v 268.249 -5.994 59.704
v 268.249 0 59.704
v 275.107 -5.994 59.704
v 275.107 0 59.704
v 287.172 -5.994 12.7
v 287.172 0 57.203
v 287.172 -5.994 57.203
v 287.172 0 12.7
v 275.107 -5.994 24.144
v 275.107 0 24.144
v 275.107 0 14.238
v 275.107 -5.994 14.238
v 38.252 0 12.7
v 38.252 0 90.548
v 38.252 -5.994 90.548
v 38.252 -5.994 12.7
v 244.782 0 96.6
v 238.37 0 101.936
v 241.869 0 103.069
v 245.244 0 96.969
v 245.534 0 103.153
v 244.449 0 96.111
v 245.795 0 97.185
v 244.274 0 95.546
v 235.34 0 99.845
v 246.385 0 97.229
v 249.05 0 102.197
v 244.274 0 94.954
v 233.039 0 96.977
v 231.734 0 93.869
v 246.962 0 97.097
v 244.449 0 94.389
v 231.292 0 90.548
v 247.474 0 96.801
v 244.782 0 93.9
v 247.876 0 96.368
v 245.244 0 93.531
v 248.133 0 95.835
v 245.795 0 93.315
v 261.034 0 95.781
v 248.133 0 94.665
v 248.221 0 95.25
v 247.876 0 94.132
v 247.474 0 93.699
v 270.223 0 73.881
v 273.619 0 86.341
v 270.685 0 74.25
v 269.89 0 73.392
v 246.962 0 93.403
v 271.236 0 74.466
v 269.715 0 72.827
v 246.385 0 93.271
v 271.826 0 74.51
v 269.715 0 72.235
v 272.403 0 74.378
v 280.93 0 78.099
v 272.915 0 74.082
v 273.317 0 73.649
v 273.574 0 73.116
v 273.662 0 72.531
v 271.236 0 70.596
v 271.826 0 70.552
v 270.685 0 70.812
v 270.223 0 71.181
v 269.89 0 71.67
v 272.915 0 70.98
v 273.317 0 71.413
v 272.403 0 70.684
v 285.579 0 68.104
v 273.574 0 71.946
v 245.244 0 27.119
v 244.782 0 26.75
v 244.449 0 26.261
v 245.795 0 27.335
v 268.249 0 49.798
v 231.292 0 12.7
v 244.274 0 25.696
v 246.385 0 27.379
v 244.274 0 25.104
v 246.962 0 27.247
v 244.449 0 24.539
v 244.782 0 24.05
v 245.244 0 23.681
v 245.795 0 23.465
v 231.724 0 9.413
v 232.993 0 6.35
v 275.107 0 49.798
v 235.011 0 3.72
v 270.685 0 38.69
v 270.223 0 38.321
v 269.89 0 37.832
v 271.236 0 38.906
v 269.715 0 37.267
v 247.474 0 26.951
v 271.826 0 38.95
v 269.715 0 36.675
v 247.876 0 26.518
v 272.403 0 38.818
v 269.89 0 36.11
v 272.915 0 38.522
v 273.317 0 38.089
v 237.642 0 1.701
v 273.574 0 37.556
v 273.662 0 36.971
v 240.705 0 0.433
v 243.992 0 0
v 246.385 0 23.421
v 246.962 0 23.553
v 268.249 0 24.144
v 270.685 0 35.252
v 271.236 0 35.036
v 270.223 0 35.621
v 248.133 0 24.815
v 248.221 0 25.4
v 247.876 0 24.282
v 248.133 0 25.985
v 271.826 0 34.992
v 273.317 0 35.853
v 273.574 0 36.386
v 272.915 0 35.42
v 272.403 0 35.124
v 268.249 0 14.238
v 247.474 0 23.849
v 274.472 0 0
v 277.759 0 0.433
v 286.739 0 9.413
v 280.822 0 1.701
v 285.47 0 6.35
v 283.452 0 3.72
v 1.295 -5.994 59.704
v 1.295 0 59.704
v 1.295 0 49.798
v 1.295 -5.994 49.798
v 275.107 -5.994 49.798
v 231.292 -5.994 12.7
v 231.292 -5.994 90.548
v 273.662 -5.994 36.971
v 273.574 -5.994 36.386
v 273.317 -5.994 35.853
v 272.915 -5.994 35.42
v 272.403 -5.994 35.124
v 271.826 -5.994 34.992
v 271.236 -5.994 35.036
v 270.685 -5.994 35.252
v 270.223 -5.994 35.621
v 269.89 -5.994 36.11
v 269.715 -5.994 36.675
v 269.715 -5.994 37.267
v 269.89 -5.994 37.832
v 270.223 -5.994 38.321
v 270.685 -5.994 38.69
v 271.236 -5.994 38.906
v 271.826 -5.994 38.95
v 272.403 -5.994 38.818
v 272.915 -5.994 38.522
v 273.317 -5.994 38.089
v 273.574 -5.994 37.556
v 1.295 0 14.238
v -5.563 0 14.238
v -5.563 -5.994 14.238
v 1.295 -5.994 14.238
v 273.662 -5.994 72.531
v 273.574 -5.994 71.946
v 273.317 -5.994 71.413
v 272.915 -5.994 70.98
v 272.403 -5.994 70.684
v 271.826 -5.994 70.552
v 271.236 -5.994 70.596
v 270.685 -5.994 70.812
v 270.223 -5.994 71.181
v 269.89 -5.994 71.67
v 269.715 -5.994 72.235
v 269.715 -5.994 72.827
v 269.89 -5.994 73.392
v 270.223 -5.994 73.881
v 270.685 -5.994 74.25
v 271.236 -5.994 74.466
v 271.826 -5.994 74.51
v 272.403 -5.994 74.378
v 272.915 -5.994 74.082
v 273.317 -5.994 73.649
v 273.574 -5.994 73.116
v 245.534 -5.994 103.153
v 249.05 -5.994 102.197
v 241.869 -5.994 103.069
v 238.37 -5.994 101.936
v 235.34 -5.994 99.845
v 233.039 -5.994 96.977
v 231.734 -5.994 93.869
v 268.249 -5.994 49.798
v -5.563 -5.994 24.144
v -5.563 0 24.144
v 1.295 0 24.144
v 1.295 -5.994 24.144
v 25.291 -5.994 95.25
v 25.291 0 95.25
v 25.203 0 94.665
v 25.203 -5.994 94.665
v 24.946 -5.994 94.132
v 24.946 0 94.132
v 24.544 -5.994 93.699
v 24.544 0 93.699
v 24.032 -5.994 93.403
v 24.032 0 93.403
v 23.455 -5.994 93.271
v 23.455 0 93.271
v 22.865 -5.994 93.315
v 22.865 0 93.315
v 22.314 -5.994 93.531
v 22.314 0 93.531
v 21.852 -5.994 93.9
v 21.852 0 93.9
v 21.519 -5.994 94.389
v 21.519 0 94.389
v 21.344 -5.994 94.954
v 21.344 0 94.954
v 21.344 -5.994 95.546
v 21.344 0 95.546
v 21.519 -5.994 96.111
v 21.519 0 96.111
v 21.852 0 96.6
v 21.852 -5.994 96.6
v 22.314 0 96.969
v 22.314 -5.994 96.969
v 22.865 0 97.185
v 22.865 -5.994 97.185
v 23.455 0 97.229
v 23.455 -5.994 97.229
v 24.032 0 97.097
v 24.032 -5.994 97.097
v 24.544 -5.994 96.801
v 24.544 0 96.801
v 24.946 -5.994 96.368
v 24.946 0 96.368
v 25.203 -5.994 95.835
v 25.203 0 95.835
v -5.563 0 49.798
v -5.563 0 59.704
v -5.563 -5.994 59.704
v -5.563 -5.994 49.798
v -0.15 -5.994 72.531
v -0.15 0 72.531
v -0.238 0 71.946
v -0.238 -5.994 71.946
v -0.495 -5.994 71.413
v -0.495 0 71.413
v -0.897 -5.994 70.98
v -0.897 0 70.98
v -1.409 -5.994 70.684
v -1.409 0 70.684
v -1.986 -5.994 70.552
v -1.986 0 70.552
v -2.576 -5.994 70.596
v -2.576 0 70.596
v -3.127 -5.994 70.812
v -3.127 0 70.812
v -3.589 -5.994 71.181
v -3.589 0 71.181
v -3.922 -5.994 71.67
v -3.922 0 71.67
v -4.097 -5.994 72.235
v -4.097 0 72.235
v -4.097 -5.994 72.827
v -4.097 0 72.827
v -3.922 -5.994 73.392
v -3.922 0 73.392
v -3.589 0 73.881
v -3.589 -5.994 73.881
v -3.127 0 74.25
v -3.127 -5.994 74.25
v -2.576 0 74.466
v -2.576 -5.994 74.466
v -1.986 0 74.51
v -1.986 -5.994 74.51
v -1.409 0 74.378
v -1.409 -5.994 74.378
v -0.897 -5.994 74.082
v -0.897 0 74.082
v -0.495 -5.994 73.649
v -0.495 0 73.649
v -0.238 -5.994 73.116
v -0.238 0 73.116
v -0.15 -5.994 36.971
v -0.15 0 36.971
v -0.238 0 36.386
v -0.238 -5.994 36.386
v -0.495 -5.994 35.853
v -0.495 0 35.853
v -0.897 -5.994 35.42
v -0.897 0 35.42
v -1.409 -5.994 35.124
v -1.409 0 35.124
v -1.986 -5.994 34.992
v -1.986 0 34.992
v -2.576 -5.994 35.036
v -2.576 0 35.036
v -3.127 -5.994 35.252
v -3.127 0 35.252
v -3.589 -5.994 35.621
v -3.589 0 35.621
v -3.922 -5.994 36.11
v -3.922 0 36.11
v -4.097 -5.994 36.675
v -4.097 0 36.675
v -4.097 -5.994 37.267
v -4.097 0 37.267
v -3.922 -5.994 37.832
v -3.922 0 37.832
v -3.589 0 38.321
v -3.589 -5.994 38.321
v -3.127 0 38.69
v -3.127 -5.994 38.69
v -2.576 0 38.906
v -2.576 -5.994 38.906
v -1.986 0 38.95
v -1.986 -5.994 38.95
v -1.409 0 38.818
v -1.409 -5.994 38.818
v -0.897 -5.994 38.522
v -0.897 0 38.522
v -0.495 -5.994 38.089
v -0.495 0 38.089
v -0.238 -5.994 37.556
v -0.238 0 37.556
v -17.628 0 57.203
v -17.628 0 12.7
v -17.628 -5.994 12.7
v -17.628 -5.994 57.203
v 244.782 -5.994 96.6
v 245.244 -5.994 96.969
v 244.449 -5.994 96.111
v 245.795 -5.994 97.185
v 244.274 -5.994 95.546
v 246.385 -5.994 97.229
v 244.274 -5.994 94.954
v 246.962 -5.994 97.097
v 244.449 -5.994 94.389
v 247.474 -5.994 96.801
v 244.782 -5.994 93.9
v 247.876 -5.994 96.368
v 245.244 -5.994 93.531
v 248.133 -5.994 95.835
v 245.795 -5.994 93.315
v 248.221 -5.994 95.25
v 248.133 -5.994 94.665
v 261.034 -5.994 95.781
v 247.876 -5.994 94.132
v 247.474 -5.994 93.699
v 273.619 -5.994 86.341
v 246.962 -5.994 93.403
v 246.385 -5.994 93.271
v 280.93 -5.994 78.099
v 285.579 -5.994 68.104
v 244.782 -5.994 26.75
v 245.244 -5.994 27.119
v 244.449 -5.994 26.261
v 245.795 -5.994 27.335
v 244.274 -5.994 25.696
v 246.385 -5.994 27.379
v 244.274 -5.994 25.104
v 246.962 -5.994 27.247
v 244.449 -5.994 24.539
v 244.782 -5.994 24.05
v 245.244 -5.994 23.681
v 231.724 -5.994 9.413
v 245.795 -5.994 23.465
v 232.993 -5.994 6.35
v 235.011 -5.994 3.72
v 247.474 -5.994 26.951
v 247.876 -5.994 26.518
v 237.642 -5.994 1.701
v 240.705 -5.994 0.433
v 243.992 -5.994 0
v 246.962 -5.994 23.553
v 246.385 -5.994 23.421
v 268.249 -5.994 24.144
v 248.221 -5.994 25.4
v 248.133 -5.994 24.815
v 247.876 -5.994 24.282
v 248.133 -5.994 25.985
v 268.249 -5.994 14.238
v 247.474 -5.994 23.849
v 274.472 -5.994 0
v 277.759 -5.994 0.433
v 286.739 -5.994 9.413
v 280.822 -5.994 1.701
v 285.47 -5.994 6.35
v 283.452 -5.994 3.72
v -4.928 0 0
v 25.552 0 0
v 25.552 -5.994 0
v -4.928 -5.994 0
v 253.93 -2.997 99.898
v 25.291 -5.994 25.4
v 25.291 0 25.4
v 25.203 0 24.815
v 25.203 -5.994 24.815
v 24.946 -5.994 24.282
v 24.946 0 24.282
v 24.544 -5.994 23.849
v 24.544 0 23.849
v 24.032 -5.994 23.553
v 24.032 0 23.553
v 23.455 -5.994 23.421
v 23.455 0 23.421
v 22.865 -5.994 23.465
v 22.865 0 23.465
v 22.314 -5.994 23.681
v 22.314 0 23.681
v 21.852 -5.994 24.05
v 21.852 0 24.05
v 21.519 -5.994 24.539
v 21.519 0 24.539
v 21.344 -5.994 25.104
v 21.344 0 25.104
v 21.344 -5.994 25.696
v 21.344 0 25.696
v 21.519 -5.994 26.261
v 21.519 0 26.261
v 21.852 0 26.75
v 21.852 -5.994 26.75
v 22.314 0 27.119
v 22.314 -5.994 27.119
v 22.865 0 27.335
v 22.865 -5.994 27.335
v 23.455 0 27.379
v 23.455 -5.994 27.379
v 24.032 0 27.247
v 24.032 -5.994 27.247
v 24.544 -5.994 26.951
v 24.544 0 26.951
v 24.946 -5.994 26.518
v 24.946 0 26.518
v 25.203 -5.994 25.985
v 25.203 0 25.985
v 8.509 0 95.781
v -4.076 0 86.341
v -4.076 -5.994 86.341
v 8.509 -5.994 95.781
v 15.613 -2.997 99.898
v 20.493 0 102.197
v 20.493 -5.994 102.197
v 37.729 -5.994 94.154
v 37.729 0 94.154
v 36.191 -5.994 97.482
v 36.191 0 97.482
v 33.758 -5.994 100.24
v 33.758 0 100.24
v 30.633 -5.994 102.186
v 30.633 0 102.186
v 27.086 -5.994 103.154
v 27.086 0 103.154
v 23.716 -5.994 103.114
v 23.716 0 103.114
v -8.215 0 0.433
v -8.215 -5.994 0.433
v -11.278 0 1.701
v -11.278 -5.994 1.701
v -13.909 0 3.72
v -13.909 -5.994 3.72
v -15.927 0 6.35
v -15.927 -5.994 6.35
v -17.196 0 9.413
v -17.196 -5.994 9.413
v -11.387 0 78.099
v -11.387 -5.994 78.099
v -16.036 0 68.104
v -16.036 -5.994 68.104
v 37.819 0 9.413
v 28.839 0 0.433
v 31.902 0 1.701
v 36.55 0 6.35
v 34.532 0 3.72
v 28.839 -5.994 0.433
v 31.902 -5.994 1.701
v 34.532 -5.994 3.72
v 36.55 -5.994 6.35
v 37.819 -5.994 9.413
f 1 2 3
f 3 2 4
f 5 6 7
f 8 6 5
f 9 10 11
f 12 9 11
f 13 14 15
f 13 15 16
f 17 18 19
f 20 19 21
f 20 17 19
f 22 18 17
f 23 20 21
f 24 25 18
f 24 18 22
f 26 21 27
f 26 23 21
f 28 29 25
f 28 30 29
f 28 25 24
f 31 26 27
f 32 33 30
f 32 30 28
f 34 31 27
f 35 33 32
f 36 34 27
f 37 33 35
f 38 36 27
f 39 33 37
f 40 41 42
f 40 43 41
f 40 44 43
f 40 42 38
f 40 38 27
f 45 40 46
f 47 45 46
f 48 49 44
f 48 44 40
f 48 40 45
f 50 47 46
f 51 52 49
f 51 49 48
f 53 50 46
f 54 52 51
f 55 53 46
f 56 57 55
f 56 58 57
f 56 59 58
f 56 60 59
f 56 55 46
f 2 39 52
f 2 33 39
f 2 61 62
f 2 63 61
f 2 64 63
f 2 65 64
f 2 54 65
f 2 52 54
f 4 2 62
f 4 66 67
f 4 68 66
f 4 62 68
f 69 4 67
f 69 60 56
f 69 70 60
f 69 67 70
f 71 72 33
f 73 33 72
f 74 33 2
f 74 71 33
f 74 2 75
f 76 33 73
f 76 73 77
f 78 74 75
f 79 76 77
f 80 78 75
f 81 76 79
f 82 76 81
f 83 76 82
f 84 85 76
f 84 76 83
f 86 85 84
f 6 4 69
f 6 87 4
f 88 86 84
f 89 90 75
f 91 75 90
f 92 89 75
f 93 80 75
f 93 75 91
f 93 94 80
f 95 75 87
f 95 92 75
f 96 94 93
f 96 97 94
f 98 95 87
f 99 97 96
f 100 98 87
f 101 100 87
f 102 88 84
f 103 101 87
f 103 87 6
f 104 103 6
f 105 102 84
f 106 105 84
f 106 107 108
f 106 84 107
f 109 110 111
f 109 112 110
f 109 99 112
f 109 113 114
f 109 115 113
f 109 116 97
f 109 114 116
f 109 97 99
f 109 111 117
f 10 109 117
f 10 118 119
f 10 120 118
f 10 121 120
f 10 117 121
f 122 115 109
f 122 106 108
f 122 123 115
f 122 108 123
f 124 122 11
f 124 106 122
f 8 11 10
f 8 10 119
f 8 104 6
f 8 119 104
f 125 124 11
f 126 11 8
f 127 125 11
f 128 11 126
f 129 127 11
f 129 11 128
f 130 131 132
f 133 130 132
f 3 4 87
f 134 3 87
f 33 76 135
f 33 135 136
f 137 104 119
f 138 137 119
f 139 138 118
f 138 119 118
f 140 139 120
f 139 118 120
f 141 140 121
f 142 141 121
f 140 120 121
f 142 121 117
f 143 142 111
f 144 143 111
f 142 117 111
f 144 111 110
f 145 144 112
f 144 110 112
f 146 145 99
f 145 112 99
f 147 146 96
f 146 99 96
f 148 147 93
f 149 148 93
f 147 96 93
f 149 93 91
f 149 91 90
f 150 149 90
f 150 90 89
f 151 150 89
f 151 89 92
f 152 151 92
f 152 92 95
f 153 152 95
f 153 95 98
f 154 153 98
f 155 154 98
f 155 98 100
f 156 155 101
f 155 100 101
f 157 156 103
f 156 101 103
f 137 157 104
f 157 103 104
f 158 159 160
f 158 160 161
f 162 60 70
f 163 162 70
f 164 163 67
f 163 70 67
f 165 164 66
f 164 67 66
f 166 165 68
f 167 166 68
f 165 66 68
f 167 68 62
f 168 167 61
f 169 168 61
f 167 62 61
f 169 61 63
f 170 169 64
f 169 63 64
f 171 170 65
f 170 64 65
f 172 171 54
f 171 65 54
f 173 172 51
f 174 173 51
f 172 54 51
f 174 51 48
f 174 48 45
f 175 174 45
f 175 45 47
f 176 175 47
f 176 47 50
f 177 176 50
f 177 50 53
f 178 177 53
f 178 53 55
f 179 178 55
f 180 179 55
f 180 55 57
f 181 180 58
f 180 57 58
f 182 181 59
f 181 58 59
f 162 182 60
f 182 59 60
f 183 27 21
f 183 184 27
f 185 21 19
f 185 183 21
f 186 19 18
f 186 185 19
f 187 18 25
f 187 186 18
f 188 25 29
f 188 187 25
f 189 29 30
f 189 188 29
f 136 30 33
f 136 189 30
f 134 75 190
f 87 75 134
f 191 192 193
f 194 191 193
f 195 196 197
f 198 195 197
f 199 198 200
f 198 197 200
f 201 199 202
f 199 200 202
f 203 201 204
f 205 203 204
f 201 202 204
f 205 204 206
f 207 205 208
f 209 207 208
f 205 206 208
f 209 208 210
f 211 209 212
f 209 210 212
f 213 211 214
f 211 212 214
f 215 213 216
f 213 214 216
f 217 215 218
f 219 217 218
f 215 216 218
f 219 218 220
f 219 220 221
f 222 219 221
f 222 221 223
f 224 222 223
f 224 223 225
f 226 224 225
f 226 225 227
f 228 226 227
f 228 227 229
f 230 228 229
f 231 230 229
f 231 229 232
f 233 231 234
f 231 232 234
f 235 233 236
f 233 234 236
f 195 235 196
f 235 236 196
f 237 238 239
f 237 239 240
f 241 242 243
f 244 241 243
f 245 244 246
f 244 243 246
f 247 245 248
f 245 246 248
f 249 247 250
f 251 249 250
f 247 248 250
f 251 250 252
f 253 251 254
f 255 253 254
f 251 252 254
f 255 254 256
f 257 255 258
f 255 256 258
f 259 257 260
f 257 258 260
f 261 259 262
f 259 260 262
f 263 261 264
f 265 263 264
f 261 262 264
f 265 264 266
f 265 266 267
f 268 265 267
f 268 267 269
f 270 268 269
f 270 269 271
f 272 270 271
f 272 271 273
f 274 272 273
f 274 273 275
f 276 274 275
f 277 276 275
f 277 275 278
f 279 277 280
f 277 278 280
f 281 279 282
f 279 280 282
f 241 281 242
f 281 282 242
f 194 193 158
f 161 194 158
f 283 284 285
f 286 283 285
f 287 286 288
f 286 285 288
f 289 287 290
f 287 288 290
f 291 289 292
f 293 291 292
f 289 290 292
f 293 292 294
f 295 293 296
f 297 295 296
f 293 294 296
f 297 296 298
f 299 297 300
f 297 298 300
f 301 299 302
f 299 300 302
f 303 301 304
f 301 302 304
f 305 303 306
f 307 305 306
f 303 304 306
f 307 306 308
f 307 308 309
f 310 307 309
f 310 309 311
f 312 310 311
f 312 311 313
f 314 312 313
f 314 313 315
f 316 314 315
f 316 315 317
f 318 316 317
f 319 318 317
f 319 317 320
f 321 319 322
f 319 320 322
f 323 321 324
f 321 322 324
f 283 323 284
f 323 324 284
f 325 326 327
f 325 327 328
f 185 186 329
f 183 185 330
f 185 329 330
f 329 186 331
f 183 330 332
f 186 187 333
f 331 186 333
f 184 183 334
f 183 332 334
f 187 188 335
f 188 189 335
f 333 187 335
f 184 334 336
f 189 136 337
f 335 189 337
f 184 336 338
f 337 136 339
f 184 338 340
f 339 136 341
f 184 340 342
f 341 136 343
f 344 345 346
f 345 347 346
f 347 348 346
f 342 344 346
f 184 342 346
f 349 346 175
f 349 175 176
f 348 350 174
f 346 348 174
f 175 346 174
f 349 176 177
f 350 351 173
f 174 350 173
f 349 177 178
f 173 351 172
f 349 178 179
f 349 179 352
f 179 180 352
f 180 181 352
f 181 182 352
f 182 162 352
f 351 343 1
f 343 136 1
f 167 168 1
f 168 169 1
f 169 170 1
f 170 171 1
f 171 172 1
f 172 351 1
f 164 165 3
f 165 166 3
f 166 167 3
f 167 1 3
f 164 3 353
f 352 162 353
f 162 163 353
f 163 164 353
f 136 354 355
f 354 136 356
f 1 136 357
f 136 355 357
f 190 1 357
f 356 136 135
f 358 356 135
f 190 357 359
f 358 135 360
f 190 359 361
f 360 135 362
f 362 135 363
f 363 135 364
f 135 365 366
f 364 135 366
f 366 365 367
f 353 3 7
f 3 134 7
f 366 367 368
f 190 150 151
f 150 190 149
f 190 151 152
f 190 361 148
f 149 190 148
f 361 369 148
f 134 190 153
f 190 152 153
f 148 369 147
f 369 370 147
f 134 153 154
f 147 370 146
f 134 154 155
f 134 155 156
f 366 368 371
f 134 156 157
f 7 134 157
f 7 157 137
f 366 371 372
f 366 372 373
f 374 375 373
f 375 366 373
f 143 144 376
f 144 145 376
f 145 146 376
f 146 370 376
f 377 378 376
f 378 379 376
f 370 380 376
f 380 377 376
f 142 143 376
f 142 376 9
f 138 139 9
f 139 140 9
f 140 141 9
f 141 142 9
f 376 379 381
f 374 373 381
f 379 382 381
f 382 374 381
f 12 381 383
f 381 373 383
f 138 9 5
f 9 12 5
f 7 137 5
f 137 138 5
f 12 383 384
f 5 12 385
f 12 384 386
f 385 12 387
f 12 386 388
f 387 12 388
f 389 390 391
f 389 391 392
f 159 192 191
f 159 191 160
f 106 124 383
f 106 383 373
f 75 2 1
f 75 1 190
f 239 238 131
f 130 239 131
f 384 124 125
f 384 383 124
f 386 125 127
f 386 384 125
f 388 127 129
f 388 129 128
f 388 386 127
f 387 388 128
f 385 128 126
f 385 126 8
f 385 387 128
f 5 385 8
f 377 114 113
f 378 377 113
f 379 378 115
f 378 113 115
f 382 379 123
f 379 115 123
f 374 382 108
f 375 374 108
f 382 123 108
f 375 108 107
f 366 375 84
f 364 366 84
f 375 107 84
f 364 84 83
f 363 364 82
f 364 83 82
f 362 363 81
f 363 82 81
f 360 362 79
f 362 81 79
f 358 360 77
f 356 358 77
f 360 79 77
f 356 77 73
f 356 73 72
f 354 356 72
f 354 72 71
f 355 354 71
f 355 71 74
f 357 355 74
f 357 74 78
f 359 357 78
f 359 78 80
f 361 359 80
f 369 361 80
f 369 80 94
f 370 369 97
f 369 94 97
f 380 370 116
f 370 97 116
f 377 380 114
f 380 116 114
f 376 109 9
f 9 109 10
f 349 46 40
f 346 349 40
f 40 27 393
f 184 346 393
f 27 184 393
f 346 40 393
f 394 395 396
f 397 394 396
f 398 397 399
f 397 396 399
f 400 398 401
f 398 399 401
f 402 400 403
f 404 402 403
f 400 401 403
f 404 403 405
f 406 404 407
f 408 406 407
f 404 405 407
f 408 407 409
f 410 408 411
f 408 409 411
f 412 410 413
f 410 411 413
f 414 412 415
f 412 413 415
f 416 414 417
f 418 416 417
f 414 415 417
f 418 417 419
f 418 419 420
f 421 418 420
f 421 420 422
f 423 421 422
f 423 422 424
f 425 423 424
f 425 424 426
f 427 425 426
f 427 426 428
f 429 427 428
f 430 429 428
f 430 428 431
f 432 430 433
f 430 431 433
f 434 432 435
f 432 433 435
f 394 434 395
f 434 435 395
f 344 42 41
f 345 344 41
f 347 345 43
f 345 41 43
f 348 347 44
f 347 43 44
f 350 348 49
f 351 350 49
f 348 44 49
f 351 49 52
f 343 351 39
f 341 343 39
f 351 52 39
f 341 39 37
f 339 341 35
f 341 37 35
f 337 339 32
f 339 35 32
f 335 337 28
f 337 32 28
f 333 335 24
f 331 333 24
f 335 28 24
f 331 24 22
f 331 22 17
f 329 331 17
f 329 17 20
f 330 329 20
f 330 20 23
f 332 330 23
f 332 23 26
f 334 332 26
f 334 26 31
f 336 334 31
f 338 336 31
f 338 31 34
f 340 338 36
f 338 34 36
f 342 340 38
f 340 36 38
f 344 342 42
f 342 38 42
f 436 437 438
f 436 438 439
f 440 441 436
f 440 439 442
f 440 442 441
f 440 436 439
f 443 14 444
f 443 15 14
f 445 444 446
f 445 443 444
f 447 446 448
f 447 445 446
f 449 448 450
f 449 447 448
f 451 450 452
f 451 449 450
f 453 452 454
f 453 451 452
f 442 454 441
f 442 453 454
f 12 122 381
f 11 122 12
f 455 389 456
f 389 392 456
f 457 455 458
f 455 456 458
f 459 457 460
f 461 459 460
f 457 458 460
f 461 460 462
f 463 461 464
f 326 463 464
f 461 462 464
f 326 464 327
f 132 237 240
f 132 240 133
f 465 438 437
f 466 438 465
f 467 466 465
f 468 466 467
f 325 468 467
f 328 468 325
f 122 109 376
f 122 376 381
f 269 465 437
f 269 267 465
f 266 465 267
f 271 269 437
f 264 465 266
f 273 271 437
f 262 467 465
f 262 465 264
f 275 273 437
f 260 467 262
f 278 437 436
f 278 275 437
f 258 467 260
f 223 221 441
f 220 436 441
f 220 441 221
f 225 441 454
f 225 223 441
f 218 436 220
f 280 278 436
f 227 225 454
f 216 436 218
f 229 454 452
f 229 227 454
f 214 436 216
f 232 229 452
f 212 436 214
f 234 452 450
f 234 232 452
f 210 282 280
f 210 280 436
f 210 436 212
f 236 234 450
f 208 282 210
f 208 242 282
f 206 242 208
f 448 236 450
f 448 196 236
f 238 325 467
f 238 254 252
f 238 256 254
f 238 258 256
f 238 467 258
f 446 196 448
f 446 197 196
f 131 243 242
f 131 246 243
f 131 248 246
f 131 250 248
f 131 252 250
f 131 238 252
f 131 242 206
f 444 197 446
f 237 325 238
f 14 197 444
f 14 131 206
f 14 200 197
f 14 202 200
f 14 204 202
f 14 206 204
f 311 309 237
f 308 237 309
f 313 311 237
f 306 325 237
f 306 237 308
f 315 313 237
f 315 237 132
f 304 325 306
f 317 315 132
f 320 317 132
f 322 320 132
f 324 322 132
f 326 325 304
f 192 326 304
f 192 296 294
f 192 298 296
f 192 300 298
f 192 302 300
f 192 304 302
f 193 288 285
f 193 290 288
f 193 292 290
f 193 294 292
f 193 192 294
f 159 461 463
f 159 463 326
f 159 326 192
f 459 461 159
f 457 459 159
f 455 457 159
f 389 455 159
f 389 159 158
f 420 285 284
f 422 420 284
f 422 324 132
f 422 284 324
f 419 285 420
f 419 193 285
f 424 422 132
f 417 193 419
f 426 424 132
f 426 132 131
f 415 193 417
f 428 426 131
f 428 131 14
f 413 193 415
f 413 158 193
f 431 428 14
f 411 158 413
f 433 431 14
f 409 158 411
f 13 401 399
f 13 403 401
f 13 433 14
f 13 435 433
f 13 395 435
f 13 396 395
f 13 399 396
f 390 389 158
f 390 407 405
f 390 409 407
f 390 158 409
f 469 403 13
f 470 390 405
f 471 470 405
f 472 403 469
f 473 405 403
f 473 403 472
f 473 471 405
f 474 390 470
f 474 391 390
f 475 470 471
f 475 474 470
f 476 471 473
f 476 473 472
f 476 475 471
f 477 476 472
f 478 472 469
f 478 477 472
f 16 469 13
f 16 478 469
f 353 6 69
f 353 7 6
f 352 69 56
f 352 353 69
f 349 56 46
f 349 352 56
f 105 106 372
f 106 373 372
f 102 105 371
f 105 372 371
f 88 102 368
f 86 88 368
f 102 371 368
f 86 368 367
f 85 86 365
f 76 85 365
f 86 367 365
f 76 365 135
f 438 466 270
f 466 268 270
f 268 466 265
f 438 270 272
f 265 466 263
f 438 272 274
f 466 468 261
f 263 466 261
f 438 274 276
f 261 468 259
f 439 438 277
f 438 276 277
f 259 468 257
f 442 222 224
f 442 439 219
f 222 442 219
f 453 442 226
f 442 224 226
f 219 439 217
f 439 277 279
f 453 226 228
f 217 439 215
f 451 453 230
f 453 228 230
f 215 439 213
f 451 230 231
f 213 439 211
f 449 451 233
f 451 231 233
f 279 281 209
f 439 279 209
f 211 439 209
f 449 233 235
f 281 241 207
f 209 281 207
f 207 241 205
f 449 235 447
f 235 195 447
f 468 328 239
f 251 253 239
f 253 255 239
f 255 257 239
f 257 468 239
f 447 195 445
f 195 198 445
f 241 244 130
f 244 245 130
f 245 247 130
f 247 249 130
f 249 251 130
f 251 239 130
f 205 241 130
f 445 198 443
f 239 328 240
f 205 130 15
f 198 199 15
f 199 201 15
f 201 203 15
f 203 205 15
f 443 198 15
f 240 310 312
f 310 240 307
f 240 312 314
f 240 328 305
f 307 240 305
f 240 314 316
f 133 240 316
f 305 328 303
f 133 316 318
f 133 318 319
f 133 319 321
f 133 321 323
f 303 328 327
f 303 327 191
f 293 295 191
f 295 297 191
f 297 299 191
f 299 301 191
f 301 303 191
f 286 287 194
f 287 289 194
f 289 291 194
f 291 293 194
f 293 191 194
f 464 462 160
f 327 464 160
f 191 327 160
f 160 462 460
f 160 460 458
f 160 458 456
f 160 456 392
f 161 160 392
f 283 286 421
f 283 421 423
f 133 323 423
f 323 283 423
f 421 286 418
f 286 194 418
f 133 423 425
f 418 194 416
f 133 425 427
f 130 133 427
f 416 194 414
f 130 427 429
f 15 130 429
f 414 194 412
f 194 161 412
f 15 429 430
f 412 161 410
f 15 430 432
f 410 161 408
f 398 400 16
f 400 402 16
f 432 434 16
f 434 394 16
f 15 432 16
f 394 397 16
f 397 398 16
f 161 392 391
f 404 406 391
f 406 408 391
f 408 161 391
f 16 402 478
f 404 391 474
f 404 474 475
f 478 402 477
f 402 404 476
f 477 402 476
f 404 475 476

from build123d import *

# Parameters (mm, degrees)
SKETCH1_R        = 1.984375
SKETCH1_W        = 6.858
SKETCH1_H        = 9.906
EXTRUDE1_DEPTH   = 5.9944
EXTRUDE1_2_DEPTH = 5.9944
FILLET1_R        = 12.7
FILLET2_R        = 12.7
FILLET3_R        = 12.7
FILLET5_R        = 12.7
FILLET6_R        = 12.7
FILLET7_R        = 38.1
FILLET8_R        = 38.1
FILLET9_R        = 12.7


with BuildPart() as part:
    # Sketch1 → Extrude1 (new body)
    with BuildSketch(Plane(origin=(0, 0, 0), x_dir=(1, 0, 0), z_dir=(0, 1, 0))):
        with BuildLine():
            Line((38.251531685, 0), (-17.628468315, 0))
            Line((-17.628468315, 0), (-17.628468315, -74.142996555))
            add(Edge.make_bspline(
                [(-17.628468315, -74.142996555), (-7.183046663, -83.85534331), (9.286812039, -99.169323354), (30.494181461, -106.074935248), (38.251531685, -108.600908597)],
                knots=[0, 0, 0, 0, 0.634214406, 1, 1, 1, 1], degree=3))
            Line((38.251531685, -108.600908597), (38.251531685, 0))
        make_face()
        with Locations((23.306531685, -95.25)):
            Circle(SKETCH1_R, mode=Mode.SUBTRACT)
        with Locations((-2.134468315, -72.531002397)):
            Circle(SKETCH1_R, mode=Mode.SUBTRACT)
        with Locations((-2.134468315, -54.751002397)):
            Rectangle(SKETCH1_W, SKETCH1_H, mode=Mode.SUBTRACT)
        with Locations((-2.134468315, -36.971002397)):
            Circle(SKETCH1_R, mode=Mode.SUBTRACT)
        with Locations((23.306531685, -25.4)):
            Circle(SKETCH1_R, mode=Mode.SUBTRACT)
        with Locations((-2.134468315, -19.191002397)):
            Rectangle(SKETCH1_W, SKETCH1_H, mode=Mode.SUBTRACT)
    extrude(amount=-EXTRUDE1_DEPTH)

    # Fillet1
    fillet1_edges = [part.edges().sort_by_distance(p)[0] for p in [
        (-17.628468315, -2.9972, 0),
    ]]
    fillet(fillet1_edges, radius=FILLET1_R)

    # Fillet2
    fillet2_edges = [part.edges().sort_by_distance(p)[0] for p in [
        (38.251531685, -2.9972, 0),
    ]]
    fillet(fillet2_edges, radius=FILLET2_R)

    # Fillet6
    fillet6_edges = [part.edges().sort_by_distance(p)[0] for p in [
        (38.251531685, -2.9972, 108.600908597),
    ]]
    fillet(fillet6_edges, radius=FILLET6_R)

    # Fillet7
    fillet7_edges = [part.edges().sort_by_distance(p)[0] for p in [
        (-17.628468315, -2.9972, 74.142996555),
    ]]
    fillet(fillet7_edges, radius=FILLET7_R)


with BuildPart() as body_2:
    # Sketch1 → Extrude1 2 (new body)
    with BuildSketch(Plane(origin=(0, 0, 0), x_dir=(1, 0, 0), z_dir=(0, 1, 0))):
        with BuildLine():
            Line((287.171531685, 0), (231.291531685, 0))
            Line((231.291531685, 0), (231.291531685, -108.600908597))
            add(Edge.make_bspline(
                [(287.171531685, -74.142996555), (276.726110033, -83.85534331), (260.25625133, -99.169323354), (239.048881908, -106.074935248), (231.291531685, -108.600908597)],
                knots=[0, 0, 0, 0, 0.634214406, 1, 1, 1, 1], degree=3))
            Line((287.171531685, -74.142996555), (287.171531685, 0))
        make_face()
        with Locations((246.236531685, -95.25)):
            Circle(SKETCH1_R, mode=Mode.SUBTRACT)
        with Locations((271.677531685, -72.531002397)):
            Circle(SKETCH1_R, mode=Mode.SUBTRACT)
        with Locations((271.677531685, -54.751002397)):
            Rectangle(SKETCH1_W, SKETCH1_H, mode=Mode.SUBTRACT)
        with Locations((246.236531685, -25.4)):
            Circle(SKETCH1_R, mode=Mode.SUBTRACT)
        with Locations((271.677531685, -36.971002397)):
            Circle(SKETCH1_R, mode=Mode.SUBTRACT)
        with Locations((271.677531685, -19.191002397)):
            Rectangle(SKETCH1_W, SKETCH1_H, mode=Mode.SUBTRACT)
    extrude(amount=-EXTRUDE1_2_DEPTH)

    # Fillet3
    fillet3_edges = [body_2.edges().sort_by_distance(p)[0] for p in [
        (287.171531685, -2.9972, 0),
    ]]
    fillet(fillet3_edges, radius=FILLET3_R)

    # Fillet5
    fillet5_edges = [body_2.edges().sort_by_distance(p)[0] for p in [
        (231.291531685, -2.9972, 0),
    ]]
    fillet(fillet5_edges, radius=FILLET5_R)

    # Fillet8
    fillet8_edges = [body_2.edges().sort_by_distance(p)[0] for p in [
        (287.171531685, -2.9972, 74.142996555),
    ]]
    fillet(fillet8_edges, radius=FILLET8_R)

    # Fillet9
    fillet9_edges = [body_2.edges().sort_by_distance(p)[0] for p in [
        (231.291531685, -2.9972, 108.600908597),
    ]]
    fillet(fillet9_edges, radius=FILLET9_R)


solid = Compound([part.part, body_2.part])
